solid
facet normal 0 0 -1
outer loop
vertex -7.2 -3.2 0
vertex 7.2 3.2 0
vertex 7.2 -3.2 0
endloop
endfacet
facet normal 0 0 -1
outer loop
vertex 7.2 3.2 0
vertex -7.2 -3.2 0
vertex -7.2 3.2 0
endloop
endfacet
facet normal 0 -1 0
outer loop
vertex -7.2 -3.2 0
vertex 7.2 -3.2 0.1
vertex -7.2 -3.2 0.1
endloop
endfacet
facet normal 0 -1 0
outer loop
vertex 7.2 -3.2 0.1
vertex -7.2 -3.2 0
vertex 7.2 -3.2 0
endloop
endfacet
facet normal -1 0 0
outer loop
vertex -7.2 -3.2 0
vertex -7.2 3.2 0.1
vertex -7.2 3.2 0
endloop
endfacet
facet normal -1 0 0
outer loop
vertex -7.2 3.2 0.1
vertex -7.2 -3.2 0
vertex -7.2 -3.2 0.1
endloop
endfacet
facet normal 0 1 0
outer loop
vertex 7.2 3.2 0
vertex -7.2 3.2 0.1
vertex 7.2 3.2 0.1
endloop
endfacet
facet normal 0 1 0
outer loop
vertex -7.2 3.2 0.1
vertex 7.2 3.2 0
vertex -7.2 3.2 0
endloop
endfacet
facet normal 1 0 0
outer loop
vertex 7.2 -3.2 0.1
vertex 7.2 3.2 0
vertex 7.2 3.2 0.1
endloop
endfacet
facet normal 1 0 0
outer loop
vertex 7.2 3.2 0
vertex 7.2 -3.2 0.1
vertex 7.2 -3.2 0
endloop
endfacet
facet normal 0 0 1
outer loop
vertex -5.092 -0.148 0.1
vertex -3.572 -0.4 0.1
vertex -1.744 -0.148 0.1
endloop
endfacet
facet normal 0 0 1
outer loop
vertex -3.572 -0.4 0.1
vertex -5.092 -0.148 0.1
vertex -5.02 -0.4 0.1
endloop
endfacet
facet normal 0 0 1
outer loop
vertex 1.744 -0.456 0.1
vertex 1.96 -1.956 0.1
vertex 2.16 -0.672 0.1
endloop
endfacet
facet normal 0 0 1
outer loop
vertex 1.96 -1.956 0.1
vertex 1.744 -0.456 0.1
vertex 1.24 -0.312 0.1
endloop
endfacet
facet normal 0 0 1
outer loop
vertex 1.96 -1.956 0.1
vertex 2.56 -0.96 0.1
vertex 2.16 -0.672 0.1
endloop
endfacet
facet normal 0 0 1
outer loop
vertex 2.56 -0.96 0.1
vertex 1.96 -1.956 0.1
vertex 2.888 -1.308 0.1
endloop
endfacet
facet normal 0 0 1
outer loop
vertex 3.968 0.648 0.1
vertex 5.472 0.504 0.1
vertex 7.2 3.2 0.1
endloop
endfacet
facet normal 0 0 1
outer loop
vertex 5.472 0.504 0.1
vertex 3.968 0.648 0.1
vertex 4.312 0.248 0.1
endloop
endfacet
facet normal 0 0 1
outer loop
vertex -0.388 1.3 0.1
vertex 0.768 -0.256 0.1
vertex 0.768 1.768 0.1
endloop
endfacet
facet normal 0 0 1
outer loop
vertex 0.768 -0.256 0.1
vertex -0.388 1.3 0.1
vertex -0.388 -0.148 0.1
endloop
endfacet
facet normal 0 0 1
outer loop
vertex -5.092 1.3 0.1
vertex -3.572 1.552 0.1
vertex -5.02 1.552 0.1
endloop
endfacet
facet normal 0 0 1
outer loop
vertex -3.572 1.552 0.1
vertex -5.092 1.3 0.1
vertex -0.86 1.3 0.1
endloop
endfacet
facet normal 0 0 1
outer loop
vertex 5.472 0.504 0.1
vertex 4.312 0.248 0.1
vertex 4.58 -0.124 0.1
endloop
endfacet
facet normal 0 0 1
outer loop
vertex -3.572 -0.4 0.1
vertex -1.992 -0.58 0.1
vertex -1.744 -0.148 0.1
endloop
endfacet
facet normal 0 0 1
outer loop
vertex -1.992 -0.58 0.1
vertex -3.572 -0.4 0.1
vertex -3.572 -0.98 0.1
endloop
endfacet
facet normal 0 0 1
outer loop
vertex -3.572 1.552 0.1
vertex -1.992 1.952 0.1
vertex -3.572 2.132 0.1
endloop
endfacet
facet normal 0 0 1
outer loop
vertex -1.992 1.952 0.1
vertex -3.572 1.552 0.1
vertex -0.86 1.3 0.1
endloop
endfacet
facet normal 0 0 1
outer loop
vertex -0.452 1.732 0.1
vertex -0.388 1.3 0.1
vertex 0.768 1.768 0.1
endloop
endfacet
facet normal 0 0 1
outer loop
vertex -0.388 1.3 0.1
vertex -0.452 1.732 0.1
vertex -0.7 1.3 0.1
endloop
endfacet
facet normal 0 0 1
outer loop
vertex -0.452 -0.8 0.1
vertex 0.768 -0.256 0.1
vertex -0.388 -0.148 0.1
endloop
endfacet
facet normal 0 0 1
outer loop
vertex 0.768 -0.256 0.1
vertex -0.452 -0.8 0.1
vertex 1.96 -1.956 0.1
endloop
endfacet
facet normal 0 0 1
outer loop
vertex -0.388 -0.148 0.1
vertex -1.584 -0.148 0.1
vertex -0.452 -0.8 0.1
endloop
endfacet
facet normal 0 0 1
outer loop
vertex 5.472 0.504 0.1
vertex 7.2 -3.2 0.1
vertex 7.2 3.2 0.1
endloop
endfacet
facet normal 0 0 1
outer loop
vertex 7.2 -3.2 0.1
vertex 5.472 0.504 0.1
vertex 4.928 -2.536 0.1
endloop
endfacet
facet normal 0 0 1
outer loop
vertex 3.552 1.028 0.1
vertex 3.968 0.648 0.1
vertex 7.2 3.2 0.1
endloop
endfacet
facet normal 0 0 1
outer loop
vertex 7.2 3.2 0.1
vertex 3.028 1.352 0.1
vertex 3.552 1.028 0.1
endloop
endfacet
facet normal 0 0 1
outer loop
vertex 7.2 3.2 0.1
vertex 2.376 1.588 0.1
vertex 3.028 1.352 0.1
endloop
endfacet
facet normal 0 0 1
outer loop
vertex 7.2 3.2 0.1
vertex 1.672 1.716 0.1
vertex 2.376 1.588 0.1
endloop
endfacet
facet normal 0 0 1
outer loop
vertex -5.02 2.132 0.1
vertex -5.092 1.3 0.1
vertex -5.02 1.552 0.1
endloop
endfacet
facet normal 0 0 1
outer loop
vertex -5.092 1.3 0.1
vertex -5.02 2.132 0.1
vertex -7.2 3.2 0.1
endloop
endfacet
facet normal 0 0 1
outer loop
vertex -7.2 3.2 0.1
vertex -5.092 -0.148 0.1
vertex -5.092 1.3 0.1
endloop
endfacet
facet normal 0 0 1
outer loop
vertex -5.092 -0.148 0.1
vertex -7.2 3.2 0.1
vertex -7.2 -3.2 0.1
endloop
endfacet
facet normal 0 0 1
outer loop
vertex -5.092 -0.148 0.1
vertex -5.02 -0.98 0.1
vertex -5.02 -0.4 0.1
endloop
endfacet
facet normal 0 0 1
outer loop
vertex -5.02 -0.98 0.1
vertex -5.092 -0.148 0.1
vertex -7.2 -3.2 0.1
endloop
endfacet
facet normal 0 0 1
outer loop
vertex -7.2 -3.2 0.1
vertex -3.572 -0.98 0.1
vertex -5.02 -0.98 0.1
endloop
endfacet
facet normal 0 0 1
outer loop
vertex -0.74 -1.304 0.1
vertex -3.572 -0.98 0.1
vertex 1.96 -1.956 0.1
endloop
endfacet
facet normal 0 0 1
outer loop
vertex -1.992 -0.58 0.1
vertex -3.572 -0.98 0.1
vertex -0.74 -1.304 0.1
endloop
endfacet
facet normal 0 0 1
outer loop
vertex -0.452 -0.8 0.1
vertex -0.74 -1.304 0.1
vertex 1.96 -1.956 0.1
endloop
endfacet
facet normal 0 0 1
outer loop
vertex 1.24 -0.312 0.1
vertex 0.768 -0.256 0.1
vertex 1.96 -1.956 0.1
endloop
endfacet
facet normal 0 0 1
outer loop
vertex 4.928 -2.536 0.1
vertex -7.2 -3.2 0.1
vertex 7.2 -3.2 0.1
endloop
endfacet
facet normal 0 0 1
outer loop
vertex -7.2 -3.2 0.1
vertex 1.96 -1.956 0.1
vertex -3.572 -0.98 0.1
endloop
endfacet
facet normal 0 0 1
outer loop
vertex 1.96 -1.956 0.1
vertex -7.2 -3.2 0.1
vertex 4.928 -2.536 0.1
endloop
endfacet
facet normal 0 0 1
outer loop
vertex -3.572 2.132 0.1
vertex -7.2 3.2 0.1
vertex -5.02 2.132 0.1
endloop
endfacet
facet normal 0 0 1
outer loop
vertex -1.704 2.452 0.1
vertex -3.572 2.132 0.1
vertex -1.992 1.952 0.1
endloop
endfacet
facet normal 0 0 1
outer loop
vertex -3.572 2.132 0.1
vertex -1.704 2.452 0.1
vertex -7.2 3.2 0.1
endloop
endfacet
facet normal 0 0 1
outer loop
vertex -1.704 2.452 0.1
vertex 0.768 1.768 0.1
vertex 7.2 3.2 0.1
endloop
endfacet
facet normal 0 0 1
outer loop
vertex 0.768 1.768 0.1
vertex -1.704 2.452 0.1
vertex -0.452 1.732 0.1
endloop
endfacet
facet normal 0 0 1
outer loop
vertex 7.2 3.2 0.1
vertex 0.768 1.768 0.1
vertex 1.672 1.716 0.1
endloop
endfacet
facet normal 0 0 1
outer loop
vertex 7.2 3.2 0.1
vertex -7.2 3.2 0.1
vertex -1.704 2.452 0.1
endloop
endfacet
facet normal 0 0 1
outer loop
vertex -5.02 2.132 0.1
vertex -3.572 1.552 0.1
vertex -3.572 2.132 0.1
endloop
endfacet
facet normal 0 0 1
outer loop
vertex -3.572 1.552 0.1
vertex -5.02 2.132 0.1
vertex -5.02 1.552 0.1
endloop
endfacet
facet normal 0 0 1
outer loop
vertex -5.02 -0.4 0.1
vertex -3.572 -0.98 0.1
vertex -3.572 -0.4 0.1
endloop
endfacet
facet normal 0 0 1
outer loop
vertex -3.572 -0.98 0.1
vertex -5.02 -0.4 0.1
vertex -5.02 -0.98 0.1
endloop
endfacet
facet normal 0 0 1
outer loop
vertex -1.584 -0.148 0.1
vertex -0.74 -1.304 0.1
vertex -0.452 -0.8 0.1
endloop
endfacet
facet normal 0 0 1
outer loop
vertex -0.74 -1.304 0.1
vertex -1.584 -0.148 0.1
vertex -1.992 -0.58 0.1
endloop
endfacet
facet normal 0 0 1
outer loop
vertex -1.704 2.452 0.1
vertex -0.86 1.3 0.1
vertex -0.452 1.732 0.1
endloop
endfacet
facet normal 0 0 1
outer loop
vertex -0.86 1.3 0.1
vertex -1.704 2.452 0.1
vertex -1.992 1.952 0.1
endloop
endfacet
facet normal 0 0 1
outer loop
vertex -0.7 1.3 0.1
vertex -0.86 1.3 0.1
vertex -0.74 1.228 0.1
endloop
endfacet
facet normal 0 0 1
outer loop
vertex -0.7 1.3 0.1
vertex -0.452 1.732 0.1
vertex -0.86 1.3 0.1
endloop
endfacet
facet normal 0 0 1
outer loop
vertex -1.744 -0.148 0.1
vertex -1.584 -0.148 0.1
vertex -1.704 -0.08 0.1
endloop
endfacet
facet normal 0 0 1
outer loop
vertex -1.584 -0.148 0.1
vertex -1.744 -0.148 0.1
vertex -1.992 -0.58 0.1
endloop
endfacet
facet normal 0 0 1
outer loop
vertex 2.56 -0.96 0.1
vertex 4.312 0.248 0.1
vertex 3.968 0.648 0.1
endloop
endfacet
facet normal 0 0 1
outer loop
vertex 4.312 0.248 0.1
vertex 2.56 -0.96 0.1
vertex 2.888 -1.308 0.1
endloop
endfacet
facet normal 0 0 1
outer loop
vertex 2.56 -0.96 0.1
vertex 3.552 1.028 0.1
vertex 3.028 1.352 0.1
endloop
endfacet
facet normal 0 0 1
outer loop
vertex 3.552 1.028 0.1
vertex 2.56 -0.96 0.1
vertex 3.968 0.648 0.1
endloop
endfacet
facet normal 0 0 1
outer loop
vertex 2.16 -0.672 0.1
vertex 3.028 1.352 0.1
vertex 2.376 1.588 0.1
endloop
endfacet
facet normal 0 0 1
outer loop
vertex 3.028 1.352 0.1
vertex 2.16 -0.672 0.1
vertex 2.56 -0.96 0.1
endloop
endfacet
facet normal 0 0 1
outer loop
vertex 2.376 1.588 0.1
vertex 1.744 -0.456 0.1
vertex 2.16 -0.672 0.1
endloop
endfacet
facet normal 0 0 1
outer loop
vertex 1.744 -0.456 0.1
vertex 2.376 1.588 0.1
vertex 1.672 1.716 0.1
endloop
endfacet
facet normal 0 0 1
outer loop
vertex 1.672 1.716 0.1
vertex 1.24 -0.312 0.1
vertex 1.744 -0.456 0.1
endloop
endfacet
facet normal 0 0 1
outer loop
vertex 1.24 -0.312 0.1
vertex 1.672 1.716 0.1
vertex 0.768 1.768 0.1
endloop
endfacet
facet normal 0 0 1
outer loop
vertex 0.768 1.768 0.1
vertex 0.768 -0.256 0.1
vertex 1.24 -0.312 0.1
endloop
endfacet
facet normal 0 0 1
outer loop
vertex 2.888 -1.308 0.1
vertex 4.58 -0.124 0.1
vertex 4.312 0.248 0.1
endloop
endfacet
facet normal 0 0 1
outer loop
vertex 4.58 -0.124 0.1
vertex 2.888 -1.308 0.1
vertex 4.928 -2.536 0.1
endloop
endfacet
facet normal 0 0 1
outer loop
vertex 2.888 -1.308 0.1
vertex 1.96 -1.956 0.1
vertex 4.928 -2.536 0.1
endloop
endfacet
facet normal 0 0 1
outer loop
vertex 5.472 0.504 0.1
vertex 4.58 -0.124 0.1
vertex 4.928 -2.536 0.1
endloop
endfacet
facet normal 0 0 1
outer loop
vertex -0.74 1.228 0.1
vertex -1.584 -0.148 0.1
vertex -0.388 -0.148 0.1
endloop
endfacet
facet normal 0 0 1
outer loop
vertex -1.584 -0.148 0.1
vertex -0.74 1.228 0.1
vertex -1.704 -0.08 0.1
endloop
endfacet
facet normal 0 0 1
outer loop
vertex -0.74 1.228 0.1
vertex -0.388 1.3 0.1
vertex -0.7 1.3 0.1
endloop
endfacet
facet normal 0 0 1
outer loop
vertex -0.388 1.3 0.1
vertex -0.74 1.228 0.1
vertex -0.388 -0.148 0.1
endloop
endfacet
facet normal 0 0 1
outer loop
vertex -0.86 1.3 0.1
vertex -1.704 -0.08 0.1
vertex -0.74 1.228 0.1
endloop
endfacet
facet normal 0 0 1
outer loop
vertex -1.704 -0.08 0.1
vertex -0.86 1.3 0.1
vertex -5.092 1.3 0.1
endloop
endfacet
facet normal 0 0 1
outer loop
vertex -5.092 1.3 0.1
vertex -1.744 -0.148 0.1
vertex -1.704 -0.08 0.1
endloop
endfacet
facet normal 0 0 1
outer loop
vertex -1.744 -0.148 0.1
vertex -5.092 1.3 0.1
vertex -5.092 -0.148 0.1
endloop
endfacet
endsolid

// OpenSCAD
// file: ../p/box5-12.scad
use <../lib.scad>
function ldraw_lib__box5_12() = [
// 0 Box with 5 Faces without Any Edges
// 0 Name: box5-12.dat
// 0 Author: Chris Dee [cwdee]
// 0 !LDRAW_ORG Primitive UPDATE 2009-02
// 0 !LICENSE Licensed under CC BY 4.0 : see CAreadme.txt
// 
// 0 BFC CERTIFY CCW
  [0,"BFC","CERTIFY"],
  [0,"BFC","CCW"],
// 
// 0 !HISTORY 2009-09-03 [PTadmin] Official Update 2009-02
// 
// 
// 4 16 1 1 1 1 1 -1 -1 1 -1 -1 1 1
  [4,16,1,1,1,1,1,-1,-1,1,-1,-1,1,1],
// 4 16 -1 0 1 1 0 1 1 1 1 -1 1 1
  [4,16,-1,0,1,1,0,1,1,1,1,-1,1,1],
// 4 16 -1 0 -1 -1 0 1 -1 1 1 -1 1 -1
  [4,16,-1,0,-1,-1,0,1,-1,1,1,-1,1,-1],
// 4 16 1 0 -1 -1 0 -1 -1 1 -1 1 1 -1
  [4,16,1,0,-1,-1,0,-1,-1,1,-1,1,1,-1],
// 4 16 1 0 1 1 0 -1 1 1 -1 1 1 1
  [4,16,1,0,1,1,0,-1,1,1,-1,1,1,1],
// 0
];
module ldraw_lib__box5_12(step=0, col=false, unit=2/5, alt=false, line=0.2, solid=!$preview)
    makepoly(ldraw_lib__box5_12(), step=step, col=col, unit=unit, alt=alt, line=line, solid=solid);
ldraw_lib__box5_12(line=0.2);
// file: 821577g.scad
use <../lib.scad>
use <../p/box5-12.scad>
function ldraw_lib__821577g() = [
// 0 Sticker  0.8 x  1.8 with Car and Red Left Curved Arrow
// 0 Name: 821577g.dat
// 0 Author: Evert-Jan Boer [ejboer]
// 0 !LDRAW_ORG Part UPDATE 2026-07
// 0 !LICENSE Licensed under CC BY 4.0 : see CAreadme.txt
// 
// 0 BFC CERTIFY CCW
  [0,"BFC","CERTIFY"],
  [0,"BFC","CCW"],
// 
// 0 !CATEGORY Sticker
// 0 !KEYWORDS Multi Control, Set 8082
// 
// 0 !HISTORY 2026-07-30 [OrionP] Official Update 2026-07
// 
// 1 16 0 -.25 0 18 0 0 0 0.25 0 0 0 8 box5-12.dat
  [1,16,0,-.25,0,18,0,0,0,0.25,0,0,0,8, ldraw_lib__box5_12()],
// 4 16 -12.73 -.25 .37 -4.36 -.25 .37 -8.93 -.25 1 -12.55 -.25 1
  [4,16,-12.73,-.25,.37,-4.36,-.25,.37,-8.93,-.25,1,-12.55,-.25,1],
// 4 16 4.9 -.25 4.89 3.1 -.25 .78 4.36 -.25 1.14 5.4 -.25 1.68
  [4,16,4.9,-.25,4.89,3.1,-.25,.78,4.36,-.25,1.14,5.4,-.25,1.68],
// 4 16 4.9 -.25 4.89 5.4 -.25 1.68 6.4 -.25 2.4 7.22 -.25 3.27
  [4,16,4.9,-.25,4.89,5.4,-.25,1.68,6.4,-.25,2.4,7.22,-.25,3.27],
// 4 16 13.68 -.25 -1.26 10.78 -.25 -.62 9.92 -.25 -1.62 18 -.25 -8
  [4,16,13.68,-.25,-1.26,10.78,-.25,-.62,9.92,-.25,-1.62,18,-.25,-8],
// 4 16 -.97 -.25 -3.25 1.92 -.25 -4.42 1.92 -.25 .64 -.97 -.25 .37
  [4,16,-.97,-.25,-3.25,1.92,-.25,-4.42,1.92,-.25,.64,-.97,-.25,.37],
// 4 16 -12.73 -.25 -3.25 -12.55 -.25 -3.88 -8.93 -.25 -3.88 -2.15 -.25 -3.25
  [4,16,-12.73,-.25,-3.25,-12.55,-.25,-3.88,-8.93,-.25,-3.88,-2.15,-.25,-3.25],
// 3 16 11.45 -.25 .31 10.78 -.25 -.62 13.68 -.25 -1.26
  [3,16,11.45,-.25,.31,10.78,-.25,-.62,13.68,-.25,-1.26],
// 4 16 -8.93 -.25 1 -4.36 -.25 .37 -4.98 -.25 1.45 -8.93 -.25 2.45
  [4,16,-8.93,-.25,1,-4.36,-.25,.37,-4.98,-.25,1.45,-8.93,-.25,2.45],
// 4 16 -4.98 -.25 -4.88 -2.15 -.25 -3.25 -8.93 -.25 -3.88 -8.93 -.25 -5.33
  [4,16,-4.98,-.25,-4.88,-2.15,-.25,-3.25,-8.93,-.25,-3.88,-8.93,-.25,-5.33],
// 4 16 -.97 -.25 -3.25 -1.75 -.25 -3.25 -1.13 -.25 -4.33 1.92 -.25 -4.42
  [4,16,-.97,-.25,-3.25,-1.75,-.25,-3.25,-1.13,-.25,-4.33,1.92,-.25,-4.42],
// 4 16 -1.13 -.25 2 -.97 -.25 .37 1.92 -.25 .64 4.9 -.25 4.89
  [4,16,-1.13,-.25,2,-.97,-.25,.37,1.92,-.25,.64,4.9,-.25,4.89],
// 3 16 -1.13 -.25 2 -3.96 -.25 .37 -.97 -.25 .37
  [3,16,-1.13,-.25,2,-3.96,-.25,.37,-.97,-.25,.37],
// 4 16 12.32 -.25 6.34 13.68 -.25 -1.26 18 -.25 -8 18 -.25 8
  [4,16,12.32,-.25,6.34,13.68,-.25,-1.26,18,-.25,-8,18,-.25,8],
// 3 16 18 -.25 -8 9.92 -.25 -1.62 8.88 -.25 -2.57
  [3,16,18,-.25,-8,9.92,-.25,-1.62,8.88,-.25,-2.57],
// 3 16 8.88 -.25 -2.57 7.57 -.25 -3.38 18 -.25 -8
  [3,16,8.88,-.25,-2.57,7.57,-.25,-3.38,18,-.25,-8],
// 3 16 7.57 -.25 -3.38 5.94 -.25 -3.97 18 -.25 -8
  [3,16,7.57,-.25,-3.38,5.94,-.25,-3.97,18,-.25,-8],
// 3 16 5.94 -.25 -3.97 4.18 -.25 -4.29 18 -.25 -8
  [3,16,5.94,-.25,-3.97,4.18,-.25,-4.29,18,-.25,-8],
// 4 16 -12.73 -.25 -3.25 -18 -.25 -8 -12.55 -.25 -5.33 -12.55 -.25 -3.88
  [4,16,-12.73,-.25,-3.25,-18,-.25,-8,-12.55,-.25,-5.33,-12.55,-.25,-3.88],
// 4 16 -12.73 -.25 .37 -18 -.25 8 -18 -.25 -8 -12.73 -.25 -3.25
  [4,16,-12.73,-.25,.37,-18,-.25,8,-18,-.25,-8,-12.73,-.25,-3.25],
// 4 16 -18 -.25 8 -12.73 -.25 .37 -12.55 -.25 1 -12.55 -.25 2.45
  [4,16,-18,-.25,8,-12.73,-.25,.37,-12.55,-.25,1,-12.55,-.25,2.45],
// 3 16 -12.55 -.25 2.45 -8.93 -.25 2.45 -18 -.25 8
  [3,16,-12.55,-.25,2.45,-8.93,-.25,2.45,-18,-.25,8],
// 3 16 4.9 -.25 4.89 -8.93 -.25 2.45 -1.85 -.25 3.26
  [3,16,4.9,-.25,4.89,-8.93,-.25,2.45,-1.85,-.25,3.26],
// 3 16 -1.85 -.25 3.26 -8.93 -.25 2.45 -4.98 -.25 1.45
  [3,16,-1.85,-.25,3.26,-8.93,-.25,2.45,-4.98,-.25,1.45],
// 3 16 4.9 -.25 4.89 -1.85 -.25 3.26 -1.13 -.25 2
  [3,16,4.9,-.25,4.89,-1.85,-.25,3.26,-1.13,-.25,2],
// 3 16 4.9 -.25 4.89 1.92 -.25 .64 3.1 -.25 .78
  [3,16,4.9,-.25,4.89,1.92,-.25,.64,3.1,-.25,.78],
// 3 16 18 -.25 8 -18 -.25 8 12.32 -.25 6.34
  [3,16,18,-.25,8,-18,-.25,8,12.32,-.25,6.34],
// 4 16 -8.93 -.25 2.45 4.9 -.25 4.89 12.32 -.25 6.34 -18 -.25 8
  [4,16,-8.93,-.25,2.45,4.9,-.25,4.89,12.32,-.25,6.34,-18,-.25,8],
// 3 16 -12.55 -.25 -5.33 -18 -.25 -8 -8.93 -.25 -5.33
  [3,16,-12.55,-.25,-5.33,-18,-.25,-8,-8.93,-.25,-5.33],
// 4 16 -8.93 -.25 -5.33 -18 -.25 -8 -4.26 -.25 -6.13 -4.98 -.25 -4.88
  [4,16,-8.93,-.25,-5.33,-18,-.25,-8,-4.26,-.25,-6.13,-4.98,-.25,-4.88],
// 4 16 1.92 -.25 -4.42 -1.13 -.25 -4.33 -4.26 -.25 -6.13 18 -.25 -8
  [4,16,1.92,-.25,-4.42,-1.13,-.25,-4.33,-4.26,-.25,-6.13,18,-.25,-8],
// 3 16 4.18 -.25 -4.29 1.92 -.25 -4.42 18 -.25 -8
  [3,16,4.18,-.25,-4.29,1.92,-.25,-4.42,18,-.25,-8],
// 3 16 -4.26 -.25 -6.13 -18 -.25 -8 18 -.25 -8
  [3,16,-4.26,-.25,-6.13,-18,-.25,-8,18,-.25,-8],
// 
// 0 BFC NOCLIP
  [0,"BFC","NOCLIP"],
// 
// 4 14 -12.55 -.25 -3.88 -12.55 -.25 -5.33 -8.93 -.25 -5.33 -8.93 -.25 -3.88
  [4,14,-12.55,-.25,-3.88,-12.55,-.25,-5.33,-8.93,-.25,-5.33,-8.93,-.25,-3.88],
// 4 14 -8.93 -.25 1 -8.93 -.25 2.45 -12.55 -.25 2.45 -12.55 -.25 1
  [4,14,-8.93,-.25,1,-8.93,-.25,2.45,-12.55,-.25,2.45,-12.55,-.25,1],
// 4 14 -4.98 -.25 1.45 -3.96 -.25 .37 -1.13 -.25 2 -1.85 -.25 3.26
  [4,14,-4.98,-.25,1.45,-3.96,-.25,.37,-1.13,-.25,2,-1.85,-.25,3.26],
// 4 14 -4.98 -.25 -4.88 -4.26 -.25 -6.13 -1.13 -.25 -4.33 -2.15 -.25 -3.25
  [4,14,-4.98,-.25,-4.88,-4.26,-.25,-6.13,-1.13,-.25,-4.33,-2.15,-.25,-3.25],
// 3 14 -1.85 -.25 -3.07 -2.15 -.25 -3.25 -1.75 -.25 -3.25
  [3,14,-1.85,-.25,-3.07,-2.15,-.25,-3.25,-1.75,-.25,-3.25],
// 3 14 -2.15 -.25 -3.25 -1.13 -.25 -4.33 -1.75 -.25 -3.25
  [3,14,-2.15,-.25,-3.25,-1.13,-.25,-4.33,-1.75,-.25,-3.25],
// 4 14 -4.26 -.25 .2 -3.96 -.25 .37 -4.98 -.25 1.45 -4.36 -.25 .37
  [4,14,-4.26,-.25,.2,-3.96,-.25,.37,-4.98,-.25,1.45,-4.36,-.25,.37],
// 4 4 6.4 -.25 2.4 9.92 -.25 -1.62 10.78 -.25 -.62 7.22 -.25 3.27
  [4,4,6.4,-.25,2.4,9.92,-.25,-1.62,10.78,-.25,-.62,7.22,-.25,3.27],
// 4 4 6.4 -.25 2.4 7.57 -.25 -3.38 8.88 -.25 -2.57 9.92 -.25 -1.62
  [4,4,6.4,-.25,2.4,7.57,-.25,-3.38,8.88,-.25,-2.57,9.92,-.25,-1.62],
// 4 4 7.57 -.25 -3.38 6.4 -.25 2.4 5.4 -.25 1.68 5.94 -.25 -3.97
  [4,4,7.57,-.25,-3.38,6.4,-.25,2.4,5.4,-.25,1.68,5.94,-.25,-3.97],
// 4 4 5.94 -.25 -3.97 5.4 -.25 1.68 4.36 -.25 1.14 4.18 -.25 -4.29
  [4,4,5.94,-.25,-3.97,5.4,-.25,1.68,4.36,-.25,1.14,4.18,-.25,-4.29],
// 4 4 4.18 -.25 -4.29 4.36 -.25 1.14 3.1 -.25 .78 1.92 -.25 -4.42
  [4,4,4.18,-.25,-4.29,4.36,-.25,1.14,3.1,-.25,.78,1.92,-.25,-4.42],
// 3 4 3.1 -.25 .78 1.92 -.25 .64 1.92 -.25 -4.42
  [3,4,3.1,-.25,.78,1.92,-.25,.64,1.92,-.25,-4.42],
// 4 4 11.45 -.25 .31 12.32 -.25 6.34 7.22 -.25 3.27 10.78 -.25 -.62
  [4,4,11.45,-.25,.31,12.32,-.25,6.34,7.22,-.25,3.27,10.78,-.25,-.62],
// 3 4 12.32 -.25 6.34 4.9 -.25 4.89 7.22 -.25 3.27
  [3,4,12.32,-.25,6.34,4.9,-.25,4.89,7.22,-.25,3.27],
// 3 4 12.32 -.25 6.34 11.45 -.25 .31 13.68 -.25 -1.26
  [3,4,12.32,-.25,6.34,11.45,-.25,.31,13.68,-.25,-1.26],
// 4 0 -4.26 -.25 .2 -1.85 -.25 -3.07 -.97 -.25 .37 -3.96 -.25 .37
  [4,0,-4.26,-.25,.2,-1.85,-.25,-3.07,-.97,-.25,.37,-3.96,-.25,.37],
// 4 0 -.97 -.25 -3.25 -.97 -.25 .37 -1.85 -.25 -3.07 -1.75 -.25 -3.25
  [4,0,-.97,-.25,-3.25,-.97,-.25,.37,-1.85,-.25,-3.07,-1.75,-.25,-3.25],
// 4 0 -2.15 -.25 -3.25 -1.85 -.25 -3.07 -4.26 -.25 .2 -12.73 -.25 -3.25
  [4,0,-2.15,-.25,-3.25,-1.85,-.25,-3.07,-4.26,-.25,.2,-12.73,-.25,-3.25],
// 4 0 -12.73 -.25 -3.25 -4.26 -.25 .2 -4.36 -.25 .37 -12.73 -.25 .37
  [4,0,-12.73,-.25,-3.25,-4.26,-.25,.2,-4.36,-.25,.37,-12.73,-.25,.37],
];
module ldraw_lib__821577g(step=0, col=false, unit=2/5, alt=false, line=0.2, solid=!$preview)
    makepoly(ldraw_lib__821577g(), step=step, col=col, unit=unit, alt=alt, line=line, solid=solid);
ldraw_lib__821577g(line=0.2);
// main file
use <../lib.scad>
use <821577g.scad>
function ldraw_lib__821577h() = [
// 0 Sticker  0.8 x  1.8 with Car and Red Right Curved Arrow
// 0 Name: 821577h.dat
// 0 Author: Evert-Jan Boer [ejboer]
// 0 !LDRAW_ORG Part UPDATE 2026-07
// 0 !LICENSE Licensed under CC BY 4.0 : see CAreadme.txt
// 
// 0 BFC CERTIFY CCW
  [0,"BFC","CERTIFY"],
  [0,"BFC","CCW"],
// 
// 0 !CATEGORY Sticker
// 0 !KEYWORDS Multi Control, Set 8082
// 
// 0 !HISTORY 2026-07-30 [OrionP] Official Update 2026-07
// 
// 1 16 0 0 0 1 0 0 0 1 0 0 0 -1 821577g.dat
  [1,16,0,0,0,1,0,0,0,1,0,0,0,-1, ldraw_lib__821577g()],
];
module ldraw_lib__821577h(step=0, col=false, unit=2/5, alt=false, line=0.2, solid=!$preview)
    makepoly(ldraw_lib__821577h(), step=step, col=col, unit=unit, alt=alt, line=line, solid=solid);
ldraw_lib__821577h(line=0.2);
